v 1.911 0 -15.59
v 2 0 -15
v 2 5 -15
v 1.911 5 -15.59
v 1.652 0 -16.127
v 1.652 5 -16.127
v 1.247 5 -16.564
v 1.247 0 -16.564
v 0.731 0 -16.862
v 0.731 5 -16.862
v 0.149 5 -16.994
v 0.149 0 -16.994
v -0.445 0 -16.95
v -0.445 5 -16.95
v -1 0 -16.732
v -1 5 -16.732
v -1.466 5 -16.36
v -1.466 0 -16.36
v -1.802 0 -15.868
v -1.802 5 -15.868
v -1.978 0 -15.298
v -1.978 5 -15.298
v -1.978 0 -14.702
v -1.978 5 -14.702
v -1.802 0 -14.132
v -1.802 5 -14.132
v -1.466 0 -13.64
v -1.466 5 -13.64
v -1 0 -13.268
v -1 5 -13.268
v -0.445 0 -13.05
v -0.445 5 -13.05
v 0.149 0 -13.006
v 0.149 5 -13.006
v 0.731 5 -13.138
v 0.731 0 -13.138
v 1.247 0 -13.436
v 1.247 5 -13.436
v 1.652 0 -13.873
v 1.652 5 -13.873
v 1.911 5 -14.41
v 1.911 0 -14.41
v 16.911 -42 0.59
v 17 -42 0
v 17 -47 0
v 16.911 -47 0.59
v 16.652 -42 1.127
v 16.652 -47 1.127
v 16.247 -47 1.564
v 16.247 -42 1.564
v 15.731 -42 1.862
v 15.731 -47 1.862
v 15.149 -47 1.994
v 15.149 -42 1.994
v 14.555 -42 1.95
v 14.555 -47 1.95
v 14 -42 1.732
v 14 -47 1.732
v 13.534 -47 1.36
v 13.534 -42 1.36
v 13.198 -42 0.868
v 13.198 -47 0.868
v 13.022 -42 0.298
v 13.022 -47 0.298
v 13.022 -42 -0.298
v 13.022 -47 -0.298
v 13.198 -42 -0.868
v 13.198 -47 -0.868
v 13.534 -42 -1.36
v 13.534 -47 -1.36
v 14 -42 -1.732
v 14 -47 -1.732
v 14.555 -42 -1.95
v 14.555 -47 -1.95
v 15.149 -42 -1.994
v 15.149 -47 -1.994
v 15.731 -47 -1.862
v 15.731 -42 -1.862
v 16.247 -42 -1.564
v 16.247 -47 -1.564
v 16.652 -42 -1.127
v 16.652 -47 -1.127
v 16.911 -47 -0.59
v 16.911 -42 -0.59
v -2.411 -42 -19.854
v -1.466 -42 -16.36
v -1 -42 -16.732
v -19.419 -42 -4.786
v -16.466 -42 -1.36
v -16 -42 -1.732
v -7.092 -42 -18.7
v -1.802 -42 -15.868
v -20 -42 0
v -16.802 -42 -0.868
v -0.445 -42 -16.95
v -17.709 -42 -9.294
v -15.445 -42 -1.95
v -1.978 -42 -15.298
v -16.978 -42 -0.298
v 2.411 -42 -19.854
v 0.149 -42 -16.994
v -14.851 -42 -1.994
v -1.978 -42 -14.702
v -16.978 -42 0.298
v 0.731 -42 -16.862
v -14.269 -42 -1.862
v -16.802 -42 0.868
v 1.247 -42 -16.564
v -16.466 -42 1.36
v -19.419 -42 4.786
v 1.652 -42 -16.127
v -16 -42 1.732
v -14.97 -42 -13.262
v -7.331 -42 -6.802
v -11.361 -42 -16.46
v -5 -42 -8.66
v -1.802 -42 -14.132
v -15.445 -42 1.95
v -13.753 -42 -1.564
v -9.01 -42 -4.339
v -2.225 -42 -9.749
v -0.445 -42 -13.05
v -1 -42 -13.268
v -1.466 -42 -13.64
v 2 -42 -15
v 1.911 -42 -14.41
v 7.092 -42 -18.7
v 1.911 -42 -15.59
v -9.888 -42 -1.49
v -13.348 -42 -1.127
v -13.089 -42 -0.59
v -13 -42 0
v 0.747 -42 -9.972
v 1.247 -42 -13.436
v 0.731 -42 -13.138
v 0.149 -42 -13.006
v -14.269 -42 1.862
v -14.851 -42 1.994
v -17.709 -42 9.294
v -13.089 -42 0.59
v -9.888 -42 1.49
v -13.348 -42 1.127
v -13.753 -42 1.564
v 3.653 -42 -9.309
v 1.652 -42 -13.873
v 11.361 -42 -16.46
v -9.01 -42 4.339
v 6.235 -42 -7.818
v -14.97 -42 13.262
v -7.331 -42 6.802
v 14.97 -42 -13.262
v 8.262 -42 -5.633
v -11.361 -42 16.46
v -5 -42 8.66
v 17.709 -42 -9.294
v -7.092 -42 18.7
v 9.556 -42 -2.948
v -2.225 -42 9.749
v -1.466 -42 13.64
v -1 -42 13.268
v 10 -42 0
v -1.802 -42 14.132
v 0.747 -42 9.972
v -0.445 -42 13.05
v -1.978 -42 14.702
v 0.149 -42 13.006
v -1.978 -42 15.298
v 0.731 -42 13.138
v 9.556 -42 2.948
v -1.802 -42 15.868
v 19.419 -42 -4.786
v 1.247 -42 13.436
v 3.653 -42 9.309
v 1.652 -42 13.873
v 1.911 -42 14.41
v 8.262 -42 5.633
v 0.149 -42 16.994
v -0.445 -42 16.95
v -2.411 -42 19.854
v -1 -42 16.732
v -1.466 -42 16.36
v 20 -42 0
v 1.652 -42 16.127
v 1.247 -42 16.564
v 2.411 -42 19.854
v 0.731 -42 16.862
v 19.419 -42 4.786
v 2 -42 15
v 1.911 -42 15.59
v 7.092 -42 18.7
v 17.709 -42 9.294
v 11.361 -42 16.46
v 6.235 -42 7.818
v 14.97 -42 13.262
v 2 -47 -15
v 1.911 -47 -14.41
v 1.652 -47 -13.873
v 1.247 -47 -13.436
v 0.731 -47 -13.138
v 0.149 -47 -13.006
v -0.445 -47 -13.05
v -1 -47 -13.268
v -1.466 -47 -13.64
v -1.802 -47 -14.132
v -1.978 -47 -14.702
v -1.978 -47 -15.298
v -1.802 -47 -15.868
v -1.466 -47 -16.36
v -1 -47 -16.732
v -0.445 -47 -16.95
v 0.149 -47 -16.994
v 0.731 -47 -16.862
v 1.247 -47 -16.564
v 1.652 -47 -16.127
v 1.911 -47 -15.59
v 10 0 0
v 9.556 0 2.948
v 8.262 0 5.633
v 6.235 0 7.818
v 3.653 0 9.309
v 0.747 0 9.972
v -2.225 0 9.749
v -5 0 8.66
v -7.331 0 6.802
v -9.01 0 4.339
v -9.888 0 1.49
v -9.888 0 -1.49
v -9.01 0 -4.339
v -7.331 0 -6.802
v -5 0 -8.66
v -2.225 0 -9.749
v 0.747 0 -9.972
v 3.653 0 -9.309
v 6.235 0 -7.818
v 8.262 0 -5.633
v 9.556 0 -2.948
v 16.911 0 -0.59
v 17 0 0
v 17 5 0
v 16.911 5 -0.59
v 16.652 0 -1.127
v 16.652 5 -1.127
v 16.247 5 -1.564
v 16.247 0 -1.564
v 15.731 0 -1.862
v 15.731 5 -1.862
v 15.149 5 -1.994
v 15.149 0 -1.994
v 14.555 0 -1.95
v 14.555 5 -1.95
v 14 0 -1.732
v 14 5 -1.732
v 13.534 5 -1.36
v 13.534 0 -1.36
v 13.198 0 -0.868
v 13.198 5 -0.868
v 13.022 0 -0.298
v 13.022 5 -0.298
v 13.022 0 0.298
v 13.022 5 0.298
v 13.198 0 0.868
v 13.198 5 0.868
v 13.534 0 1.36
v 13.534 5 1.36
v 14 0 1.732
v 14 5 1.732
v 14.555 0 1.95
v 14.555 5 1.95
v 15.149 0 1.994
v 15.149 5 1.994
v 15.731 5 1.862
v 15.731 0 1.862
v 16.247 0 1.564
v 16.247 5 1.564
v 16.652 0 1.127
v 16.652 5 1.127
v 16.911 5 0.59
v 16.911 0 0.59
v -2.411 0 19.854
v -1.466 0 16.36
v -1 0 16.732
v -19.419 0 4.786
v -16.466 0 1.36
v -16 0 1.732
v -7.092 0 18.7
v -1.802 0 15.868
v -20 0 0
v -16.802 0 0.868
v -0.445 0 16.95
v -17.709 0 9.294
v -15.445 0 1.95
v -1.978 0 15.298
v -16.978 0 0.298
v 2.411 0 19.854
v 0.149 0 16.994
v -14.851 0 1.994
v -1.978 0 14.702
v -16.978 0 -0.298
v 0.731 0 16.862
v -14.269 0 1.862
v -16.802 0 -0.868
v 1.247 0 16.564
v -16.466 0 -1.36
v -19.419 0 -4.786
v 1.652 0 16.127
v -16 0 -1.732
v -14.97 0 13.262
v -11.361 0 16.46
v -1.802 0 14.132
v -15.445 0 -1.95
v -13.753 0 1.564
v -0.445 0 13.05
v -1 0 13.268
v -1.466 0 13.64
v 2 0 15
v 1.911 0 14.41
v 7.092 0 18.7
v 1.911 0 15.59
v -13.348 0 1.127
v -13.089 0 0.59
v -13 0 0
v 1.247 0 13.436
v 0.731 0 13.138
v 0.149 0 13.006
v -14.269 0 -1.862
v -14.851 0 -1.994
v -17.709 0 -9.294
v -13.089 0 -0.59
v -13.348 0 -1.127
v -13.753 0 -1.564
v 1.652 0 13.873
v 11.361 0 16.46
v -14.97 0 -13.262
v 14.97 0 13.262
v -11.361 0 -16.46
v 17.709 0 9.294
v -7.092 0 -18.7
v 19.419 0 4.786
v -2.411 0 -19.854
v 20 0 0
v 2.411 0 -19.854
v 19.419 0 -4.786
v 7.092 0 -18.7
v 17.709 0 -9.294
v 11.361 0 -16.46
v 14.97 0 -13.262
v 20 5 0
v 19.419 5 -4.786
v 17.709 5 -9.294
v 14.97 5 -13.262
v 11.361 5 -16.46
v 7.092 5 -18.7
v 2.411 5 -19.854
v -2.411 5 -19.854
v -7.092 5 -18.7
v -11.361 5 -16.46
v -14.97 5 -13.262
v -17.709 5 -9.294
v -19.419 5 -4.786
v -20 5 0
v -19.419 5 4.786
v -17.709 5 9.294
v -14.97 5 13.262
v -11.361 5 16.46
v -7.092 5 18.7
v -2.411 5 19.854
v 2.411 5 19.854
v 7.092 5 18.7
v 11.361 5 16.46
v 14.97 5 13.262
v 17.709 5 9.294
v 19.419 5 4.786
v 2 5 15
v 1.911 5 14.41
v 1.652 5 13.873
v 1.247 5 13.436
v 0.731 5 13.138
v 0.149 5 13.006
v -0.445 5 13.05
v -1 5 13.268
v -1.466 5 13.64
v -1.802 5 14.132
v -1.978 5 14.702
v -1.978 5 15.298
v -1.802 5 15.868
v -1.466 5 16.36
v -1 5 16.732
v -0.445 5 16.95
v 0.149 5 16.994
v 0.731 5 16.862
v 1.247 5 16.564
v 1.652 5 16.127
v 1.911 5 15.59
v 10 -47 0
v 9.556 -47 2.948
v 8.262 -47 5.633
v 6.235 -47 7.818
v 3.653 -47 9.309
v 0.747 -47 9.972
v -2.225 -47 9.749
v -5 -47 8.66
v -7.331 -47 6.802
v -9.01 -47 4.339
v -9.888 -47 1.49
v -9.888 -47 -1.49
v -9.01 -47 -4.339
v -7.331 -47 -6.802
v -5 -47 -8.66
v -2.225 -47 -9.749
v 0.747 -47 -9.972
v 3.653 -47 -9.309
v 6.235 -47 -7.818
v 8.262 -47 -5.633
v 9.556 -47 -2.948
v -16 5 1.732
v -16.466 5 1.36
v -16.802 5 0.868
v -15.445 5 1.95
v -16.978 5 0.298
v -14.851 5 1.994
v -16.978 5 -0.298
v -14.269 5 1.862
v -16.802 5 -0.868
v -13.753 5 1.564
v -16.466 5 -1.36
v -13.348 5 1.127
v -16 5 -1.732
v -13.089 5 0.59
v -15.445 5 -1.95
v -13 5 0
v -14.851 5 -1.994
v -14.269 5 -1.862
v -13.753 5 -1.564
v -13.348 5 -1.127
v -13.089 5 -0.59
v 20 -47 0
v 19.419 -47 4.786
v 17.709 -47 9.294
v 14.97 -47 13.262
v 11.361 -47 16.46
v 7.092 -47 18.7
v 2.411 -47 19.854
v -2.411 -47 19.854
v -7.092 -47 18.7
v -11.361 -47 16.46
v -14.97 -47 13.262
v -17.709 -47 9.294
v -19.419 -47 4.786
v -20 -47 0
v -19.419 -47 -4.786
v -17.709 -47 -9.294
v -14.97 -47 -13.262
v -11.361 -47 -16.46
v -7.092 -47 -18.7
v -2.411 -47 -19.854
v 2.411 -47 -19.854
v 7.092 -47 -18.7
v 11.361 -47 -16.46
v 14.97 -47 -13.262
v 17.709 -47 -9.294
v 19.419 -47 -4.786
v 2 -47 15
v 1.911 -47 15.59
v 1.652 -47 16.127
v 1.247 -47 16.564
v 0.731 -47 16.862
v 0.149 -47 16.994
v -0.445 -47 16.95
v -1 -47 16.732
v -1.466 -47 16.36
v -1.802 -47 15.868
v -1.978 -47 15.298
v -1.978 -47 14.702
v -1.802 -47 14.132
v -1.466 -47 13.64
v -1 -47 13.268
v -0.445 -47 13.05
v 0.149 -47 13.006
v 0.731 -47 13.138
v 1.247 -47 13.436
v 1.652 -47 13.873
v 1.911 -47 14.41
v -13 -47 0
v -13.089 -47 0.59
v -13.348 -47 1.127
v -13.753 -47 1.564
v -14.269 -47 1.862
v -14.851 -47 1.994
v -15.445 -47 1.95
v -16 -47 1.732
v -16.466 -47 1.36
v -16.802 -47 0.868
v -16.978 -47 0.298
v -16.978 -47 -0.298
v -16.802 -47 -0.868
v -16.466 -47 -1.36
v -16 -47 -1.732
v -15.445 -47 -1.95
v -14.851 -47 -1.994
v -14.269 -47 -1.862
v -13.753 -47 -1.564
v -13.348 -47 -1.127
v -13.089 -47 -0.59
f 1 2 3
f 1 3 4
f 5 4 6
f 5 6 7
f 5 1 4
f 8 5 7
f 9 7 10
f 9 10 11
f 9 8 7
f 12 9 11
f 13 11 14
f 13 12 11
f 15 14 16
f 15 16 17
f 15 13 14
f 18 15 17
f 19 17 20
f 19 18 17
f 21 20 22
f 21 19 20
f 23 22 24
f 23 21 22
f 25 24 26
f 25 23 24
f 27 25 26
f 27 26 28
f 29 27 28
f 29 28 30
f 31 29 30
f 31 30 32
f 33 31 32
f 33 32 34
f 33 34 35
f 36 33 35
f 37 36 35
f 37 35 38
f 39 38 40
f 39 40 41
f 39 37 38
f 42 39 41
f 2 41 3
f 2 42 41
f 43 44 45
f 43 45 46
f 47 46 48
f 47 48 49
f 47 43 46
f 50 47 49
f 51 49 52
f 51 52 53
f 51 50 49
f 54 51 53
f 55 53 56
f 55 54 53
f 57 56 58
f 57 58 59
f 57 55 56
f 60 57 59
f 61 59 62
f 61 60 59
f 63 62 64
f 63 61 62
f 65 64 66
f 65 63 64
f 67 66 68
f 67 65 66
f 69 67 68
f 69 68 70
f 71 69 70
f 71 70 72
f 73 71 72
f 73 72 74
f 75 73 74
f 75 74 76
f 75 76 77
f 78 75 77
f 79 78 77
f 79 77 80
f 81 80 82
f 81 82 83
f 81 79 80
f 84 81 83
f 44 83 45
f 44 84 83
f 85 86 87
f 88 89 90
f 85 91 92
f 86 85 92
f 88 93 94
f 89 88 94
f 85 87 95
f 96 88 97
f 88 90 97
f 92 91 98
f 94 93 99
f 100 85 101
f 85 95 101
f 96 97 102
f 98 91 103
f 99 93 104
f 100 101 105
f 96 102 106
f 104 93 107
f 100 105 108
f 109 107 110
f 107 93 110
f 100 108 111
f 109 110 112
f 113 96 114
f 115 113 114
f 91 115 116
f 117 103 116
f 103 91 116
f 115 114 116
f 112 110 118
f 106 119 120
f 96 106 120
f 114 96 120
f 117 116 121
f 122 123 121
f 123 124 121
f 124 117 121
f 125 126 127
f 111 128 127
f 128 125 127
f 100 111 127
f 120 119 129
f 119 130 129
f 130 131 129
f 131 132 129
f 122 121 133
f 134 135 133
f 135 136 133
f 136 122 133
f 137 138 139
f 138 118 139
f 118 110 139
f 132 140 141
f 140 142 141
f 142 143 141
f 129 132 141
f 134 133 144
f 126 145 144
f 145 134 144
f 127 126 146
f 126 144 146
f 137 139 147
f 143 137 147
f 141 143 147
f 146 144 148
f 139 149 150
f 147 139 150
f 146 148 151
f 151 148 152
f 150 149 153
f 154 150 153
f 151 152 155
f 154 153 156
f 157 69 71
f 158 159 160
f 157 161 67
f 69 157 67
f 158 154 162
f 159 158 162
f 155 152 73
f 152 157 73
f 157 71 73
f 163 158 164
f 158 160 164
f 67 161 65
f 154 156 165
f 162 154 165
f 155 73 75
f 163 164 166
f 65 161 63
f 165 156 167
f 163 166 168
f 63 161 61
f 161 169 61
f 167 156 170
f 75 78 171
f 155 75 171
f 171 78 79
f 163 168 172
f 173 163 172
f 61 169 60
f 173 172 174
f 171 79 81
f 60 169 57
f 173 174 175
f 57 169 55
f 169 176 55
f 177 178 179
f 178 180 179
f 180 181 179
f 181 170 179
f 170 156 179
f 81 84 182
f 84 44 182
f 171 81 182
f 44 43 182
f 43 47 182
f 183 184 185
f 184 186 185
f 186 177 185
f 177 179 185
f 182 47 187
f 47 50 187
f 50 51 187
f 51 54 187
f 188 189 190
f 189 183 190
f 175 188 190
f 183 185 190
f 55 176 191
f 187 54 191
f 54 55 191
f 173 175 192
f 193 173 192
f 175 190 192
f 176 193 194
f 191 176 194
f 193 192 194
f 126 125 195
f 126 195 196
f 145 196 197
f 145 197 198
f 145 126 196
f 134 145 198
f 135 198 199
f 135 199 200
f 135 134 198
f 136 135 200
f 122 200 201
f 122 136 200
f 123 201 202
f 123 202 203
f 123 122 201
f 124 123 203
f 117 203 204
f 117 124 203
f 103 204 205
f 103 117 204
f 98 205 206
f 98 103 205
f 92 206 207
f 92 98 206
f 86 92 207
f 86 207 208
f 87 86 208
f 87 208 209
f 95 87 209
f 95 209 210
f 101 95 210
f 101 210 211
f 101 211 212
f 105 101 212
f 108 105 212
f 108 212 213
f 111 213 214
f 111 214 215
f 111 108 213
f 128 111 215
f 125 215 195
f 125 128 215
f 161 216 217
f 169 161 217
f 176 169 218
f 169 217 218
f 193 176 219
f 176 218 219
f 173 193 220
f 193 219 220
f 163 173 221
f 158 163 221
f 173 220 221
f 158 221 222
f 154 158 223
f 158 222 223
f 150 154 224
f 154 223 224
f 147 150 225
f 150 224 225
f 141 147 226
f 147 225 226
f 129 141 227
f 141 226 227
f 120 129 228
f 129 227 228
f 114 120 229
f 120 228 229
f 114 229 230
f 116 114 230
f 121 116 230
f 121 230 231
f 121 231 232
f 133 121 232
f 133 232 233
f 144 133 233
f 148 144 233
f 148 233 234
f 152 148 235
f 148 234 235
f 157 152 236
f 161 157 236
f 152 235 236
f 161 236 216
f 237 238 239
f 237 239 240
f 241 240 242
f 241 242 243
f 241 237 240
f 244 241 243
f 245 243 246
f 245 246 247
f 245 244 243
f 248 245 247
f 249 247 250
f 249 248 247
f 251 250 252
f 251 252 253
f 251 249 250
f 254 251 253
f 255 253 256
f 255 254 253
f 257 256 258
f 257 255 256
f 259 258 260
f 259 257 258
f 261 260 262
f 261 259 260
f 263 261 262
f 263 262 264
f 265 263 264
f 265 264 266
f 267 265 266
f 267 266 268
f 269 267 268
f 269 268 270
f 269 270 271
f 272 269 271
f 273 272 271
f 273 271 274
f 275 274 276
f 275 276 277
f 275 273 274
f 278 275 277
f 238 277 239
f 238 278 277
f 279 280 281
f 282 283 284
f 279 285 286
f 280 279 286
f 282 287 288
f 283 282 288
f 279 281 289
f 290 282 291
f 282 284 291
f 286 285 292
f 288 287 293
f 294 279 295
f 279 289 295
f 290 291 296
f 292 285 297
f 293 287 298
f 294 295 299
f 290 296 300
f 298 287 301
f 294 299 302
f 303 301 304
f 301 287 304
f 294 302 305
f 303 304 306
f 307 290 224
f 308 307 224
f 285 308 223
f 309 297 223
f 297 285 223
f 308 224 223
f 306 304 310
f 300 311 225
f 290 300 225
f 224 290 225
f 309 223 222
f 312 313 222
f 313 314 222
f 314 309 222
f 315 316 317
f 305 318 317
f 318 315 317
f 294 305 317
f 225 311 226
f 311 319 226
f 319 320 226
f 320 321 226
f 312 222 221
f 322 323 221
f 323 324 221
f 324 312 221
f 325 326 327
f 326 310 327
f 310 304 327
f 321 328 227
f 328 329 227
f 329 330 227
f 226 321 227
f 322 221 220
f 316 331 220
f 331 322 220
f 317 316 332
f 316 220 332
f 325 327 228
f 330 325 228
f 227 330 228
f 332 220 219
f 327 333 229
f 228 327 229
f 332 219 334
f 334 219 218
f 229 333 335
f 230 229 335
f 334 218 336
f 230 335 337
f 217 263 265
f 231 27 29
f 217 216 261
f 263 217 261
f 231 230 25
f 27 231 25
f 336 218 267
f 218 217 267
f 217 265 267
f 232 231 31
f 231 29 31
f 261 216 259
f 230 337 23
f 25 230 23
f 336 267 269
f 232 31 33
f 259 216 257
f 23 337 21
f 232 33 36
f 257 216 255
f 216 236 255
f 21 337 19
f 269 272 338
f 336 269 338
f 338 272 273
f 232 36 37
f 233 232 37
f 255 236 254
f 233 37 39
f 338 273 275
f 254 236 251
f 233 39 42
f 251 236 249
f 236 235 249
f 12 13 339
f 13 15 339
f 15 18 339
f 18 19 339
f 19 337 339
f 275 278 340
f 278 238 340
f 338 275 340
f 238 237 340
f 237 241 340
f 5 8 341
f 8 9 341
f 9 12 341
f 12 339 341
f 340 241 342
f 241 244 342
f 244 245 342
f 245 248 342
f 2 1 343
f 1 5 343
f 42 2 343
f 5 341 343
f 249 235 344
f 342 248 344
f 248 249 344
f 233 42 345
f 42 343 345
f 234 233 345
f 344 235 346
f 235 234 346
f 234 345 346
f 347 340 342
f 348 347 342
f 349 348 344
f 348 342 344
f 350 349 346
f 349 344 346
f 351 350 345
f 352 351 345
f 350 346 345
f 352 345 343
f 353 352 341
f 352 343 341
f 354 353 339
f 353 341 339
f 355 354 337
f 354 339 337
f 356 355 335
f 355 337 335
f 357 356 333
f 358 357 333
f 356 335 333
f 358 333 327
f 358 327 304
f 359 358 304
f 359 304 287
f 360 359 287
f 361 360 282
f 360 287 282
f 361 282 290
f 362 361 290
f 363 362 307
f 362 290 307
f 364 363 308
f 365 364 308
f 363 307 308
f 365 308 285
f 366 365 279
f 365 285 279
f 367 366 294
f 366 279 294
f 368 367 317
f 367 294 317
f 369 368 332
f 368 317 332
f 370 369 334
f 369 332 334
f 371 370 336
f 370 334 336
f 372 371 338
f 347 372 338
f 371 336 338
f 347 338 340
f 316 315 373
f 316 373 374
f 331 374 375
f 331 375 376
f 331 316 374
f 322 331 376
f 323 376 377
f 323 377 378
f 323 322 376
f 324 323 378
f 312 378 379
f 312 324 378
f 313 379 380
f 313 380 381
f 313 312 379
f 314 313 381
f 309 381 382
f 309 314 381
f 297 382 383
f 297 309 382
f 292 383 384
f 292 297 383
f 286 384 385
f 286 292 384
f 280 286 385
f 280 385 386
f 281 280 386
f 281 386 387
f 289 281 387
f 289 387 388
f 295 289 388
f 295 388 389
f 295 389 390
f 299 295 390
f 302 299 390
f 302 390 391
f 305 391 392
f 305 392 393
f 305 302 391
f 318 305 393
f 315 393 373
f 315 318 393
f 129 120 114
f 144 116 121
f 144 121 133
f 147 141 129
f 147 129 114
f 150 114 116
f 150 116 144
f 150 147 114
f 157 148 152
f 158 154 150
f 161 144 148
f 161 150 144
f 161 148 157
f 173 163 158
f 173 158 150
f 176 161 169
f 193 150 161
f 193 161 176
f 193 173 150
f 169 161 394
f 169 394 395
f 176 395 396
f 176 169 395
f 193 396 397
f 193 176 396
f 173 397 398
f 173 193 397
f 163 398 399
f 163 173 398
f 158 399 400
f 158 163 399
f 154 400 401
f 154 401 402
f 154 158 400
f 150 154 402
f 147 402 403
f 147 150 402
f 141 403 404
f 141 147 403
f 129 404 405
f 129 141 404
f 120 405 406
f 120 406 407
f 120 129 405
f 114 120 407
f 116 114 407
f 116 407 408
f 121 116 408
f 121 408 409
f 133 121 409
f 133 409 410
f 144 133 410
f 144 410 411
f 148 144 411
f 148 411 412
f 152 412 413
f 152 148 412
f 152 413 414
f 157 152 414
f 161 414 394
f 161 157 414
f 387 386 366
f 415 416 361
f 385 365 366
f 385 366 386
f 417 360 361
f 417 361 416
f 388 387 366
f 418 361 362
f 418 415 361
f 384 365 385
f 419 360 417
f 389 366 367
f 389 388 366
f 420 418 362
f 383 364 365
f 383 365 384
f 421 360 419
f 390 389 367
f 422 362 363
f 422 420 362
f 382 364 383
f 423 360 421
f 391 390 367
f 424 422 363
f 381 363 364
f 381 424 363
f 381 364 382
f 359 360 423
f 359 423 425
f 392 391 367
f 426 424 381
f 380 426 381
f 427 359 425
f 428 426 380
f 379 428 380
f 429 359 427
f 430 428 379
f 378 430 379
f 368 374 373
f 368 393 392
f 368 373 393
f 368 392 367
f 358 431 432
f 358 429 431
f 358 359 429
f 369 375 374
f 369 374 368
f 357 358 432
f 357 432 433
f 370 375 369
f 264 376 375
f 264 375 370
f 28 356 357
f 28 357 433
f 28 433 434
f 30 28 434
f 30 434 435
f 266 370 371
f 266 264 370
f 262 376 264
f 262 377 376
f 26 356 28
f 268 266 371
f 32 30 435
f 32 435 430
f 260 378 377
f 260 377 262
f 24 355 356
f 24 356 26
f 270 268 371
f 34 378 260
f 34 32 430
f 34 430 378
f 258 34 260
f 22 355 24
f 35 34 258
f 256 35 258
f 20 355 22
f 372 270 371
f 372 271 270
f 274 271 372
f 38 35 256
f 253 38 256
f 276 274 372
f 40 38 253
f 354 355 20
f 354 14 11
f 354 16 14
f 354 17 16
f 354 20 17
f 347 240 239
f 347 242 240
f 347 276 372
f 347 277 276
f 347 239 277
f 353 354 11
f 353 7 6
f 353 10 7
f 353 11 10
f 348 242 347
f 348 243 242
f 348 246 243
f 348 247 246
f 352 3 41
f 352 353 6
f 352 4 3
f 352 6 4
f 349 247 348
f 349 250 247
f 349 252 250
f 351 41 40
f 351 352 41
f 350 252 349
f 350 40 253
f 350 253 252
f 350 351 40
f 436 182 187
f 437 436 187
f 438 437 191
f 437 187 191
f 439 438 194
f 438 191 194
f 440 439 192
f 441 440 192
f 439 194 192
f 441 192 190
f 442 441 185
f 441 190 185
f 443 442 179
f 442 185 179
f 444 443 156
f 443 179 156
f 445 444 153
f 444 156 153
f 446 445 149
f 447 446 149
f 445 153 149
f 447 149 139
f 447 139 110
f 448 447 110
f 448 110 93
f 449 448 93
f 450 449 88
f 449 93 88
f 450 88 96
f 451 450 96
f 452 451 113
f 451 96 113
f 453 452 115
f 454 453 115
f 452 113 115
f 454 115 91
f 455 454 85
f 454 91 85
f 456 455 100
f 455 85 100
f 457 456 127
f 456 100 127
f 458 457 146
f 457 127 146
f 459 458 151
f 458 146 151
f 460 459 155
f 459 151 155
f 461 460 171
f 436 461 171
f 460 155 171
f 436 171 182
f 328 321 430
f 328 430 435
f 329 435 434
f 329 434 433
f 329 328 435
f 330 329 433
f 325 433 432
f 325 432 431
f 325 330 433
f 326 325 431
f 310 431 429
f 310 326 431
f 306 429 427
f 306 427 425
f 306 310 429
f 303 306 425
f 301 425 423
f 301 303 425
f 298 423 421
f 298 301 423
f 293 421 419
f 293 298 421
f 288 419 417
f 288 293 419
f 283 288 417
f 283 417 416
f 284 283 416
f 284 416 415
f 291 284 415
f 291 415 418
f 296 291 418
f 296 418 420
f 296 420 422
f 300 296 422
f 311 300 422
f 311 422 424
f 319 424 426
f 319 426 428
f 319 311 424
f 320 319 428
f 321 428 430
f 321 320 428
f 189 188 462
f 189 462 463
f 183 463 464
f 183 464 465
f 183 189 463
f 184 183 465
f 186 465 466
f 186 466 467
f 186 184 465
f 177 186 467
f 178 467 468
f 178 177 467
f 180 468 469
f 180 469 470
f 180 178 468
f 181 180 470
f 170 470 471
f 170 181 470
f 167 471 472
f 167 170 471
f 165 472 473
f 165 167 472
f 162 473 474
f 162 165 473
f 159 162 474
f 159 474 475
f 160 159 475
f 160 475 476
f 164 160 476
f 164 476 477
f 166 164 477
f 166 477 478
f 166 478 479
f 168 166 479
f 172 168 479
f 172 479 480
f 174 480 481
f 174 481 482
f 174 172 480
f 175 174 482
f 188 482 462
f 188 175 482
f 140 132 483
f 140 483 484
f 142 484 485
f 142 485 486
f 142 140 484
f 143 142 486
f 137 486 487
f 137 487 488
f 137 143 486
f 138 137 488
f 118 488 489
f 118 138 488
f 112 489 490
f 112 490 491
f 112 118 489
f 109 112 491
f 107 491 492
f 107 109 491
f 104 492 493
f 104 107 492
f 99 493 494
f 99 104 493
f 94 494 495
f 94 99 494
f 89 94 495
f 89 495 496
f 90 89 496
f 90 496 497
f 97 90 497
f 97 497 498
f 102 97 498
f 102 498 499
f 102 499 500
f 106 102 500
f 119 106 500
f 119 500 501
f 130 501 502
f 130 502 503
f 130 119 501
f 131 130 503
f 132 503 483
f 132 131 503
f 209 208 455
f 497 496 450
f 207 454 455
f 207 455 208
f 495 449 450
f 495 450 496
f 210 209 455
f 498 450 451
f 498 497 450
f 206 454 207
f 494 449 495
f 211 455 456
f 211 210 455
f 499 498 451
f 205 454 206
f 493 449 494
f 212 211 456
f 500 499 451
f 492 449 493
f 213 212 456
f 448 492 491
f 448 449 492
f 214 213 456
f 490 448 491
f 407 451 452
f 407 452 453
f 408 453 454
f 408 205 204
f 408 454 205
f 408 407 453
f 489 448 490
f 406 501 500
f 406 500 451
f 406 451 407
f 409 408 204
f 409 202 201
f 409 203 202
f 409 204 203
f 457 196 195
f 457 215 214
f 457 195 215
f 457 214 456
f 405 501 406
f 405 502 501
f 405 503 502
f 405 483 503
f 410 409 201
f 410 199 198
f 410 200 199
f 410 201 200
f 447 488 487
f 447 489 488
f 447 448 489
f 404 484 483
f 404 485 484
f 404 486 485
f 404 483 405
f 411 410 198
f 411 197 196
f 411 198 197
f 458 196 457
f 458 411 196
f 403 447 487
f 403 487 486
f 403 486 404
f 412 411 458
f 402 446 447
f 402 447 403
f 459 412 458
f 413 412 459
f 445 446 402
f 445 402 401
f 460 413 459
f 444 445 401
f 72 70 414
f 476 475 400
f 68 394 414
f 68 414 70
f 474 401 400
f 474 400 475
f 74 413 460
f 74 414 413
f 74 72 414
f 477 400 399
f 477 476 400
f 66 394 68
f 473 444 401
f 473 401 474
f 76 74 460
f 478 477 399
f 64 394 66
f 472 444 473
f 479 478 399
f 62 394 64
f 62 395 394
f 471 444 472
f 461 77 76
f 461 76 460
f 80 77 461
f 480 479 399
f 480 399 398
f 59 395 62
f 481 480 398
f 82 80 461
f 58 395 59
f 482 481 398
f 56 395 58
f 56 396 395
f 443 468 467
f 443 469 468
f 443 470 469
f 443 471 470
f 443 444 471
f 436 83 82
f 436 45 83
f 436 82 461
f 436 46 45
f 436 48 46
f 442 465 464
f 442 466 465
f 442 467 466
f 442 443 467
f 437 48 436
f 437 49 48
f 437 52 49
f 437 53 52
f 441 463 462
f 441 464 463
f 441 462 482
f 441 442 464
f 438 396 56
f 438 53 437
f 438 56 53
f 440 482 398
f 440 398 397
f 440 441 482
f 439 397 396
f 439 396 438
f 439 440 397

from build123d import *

# Parameters (mm, degrees)
SKETCH1_R           = 20
SKETCH1_R_2         = 2
BOSS_EXTRUDE1_DEPTH = 5
SKETCH2_R           = 10
BOSS_EXTRUDE2_DEPTH = 42
SKETCH3_R           = 20
SKETCH3_R_2         = 10
SKETCH3_R_3         = 2
BOSS_EXTRUDE3_DEPTH = 5


with BuildPart() as part:
    # Sketch1 → Boss-Extrude1 (new body)
    with BuildSketch(Plane(origin=(0, 0, 0), x_dir=(1, 0, 0), z_dir=(0, 1, 0))):
        Circle(SKETCH1_R)
        with Locations((0, 15)):
            Circle(SKETCH1_R_2, mode=Mode.SUBTRACT)
        with Locations((15, 0)):
            Circle(SKETCH1_R_2, mode=Mode.SUBTRACT)
        with Locations((0, -15)):
            Circle(SKETCH1_R_2, mode=Mode.SUBTRACT)
        with Locations((-15, 0)):
            Circle(SKETCH1_R_2, mode=Mode.SUBTRACT)
    extrude(amount=BOSS_EXTRUDE1_DEPTH)

    # Sketch2 → Boss-Extrude2 (add)
    with BuildSketch(Plane.XZ):
        Circle(SKETCH2_R)
    extrude(amount=BOSS_EXTRUDE2_DEPTH)


with BuildPart() as body_2:
    # Sketch3 → Boss-Extrude3 (new body)
    with BuildSketch(Plane.XZ.offset(42)):
        Circle(SKETCH3_R)
        Circle(SKETCH3_R_2, mode=Mode.SUBTRACT)
        with Locations((-15, 0)):
            Circle(SKETCH3_R_3, mode=Mode.SUBTRACT)
        with Locations((0, -15)):
            Circle(SKETCH3_R_3, mode=Mode.SUBTRACT)
        with Locations((15, 0)):
            Circle(SKETCH3_R_3, mode=Mode.SUBTRACT)
        with Locations((0, 15)):
            Circle(SKETCH3_R_3, mode=Mode.SUBTRACT)
    extrude(amount=BOSS_EXTRUDE3_DEPTH)


solid = Compound([part.part, body_2.part])
